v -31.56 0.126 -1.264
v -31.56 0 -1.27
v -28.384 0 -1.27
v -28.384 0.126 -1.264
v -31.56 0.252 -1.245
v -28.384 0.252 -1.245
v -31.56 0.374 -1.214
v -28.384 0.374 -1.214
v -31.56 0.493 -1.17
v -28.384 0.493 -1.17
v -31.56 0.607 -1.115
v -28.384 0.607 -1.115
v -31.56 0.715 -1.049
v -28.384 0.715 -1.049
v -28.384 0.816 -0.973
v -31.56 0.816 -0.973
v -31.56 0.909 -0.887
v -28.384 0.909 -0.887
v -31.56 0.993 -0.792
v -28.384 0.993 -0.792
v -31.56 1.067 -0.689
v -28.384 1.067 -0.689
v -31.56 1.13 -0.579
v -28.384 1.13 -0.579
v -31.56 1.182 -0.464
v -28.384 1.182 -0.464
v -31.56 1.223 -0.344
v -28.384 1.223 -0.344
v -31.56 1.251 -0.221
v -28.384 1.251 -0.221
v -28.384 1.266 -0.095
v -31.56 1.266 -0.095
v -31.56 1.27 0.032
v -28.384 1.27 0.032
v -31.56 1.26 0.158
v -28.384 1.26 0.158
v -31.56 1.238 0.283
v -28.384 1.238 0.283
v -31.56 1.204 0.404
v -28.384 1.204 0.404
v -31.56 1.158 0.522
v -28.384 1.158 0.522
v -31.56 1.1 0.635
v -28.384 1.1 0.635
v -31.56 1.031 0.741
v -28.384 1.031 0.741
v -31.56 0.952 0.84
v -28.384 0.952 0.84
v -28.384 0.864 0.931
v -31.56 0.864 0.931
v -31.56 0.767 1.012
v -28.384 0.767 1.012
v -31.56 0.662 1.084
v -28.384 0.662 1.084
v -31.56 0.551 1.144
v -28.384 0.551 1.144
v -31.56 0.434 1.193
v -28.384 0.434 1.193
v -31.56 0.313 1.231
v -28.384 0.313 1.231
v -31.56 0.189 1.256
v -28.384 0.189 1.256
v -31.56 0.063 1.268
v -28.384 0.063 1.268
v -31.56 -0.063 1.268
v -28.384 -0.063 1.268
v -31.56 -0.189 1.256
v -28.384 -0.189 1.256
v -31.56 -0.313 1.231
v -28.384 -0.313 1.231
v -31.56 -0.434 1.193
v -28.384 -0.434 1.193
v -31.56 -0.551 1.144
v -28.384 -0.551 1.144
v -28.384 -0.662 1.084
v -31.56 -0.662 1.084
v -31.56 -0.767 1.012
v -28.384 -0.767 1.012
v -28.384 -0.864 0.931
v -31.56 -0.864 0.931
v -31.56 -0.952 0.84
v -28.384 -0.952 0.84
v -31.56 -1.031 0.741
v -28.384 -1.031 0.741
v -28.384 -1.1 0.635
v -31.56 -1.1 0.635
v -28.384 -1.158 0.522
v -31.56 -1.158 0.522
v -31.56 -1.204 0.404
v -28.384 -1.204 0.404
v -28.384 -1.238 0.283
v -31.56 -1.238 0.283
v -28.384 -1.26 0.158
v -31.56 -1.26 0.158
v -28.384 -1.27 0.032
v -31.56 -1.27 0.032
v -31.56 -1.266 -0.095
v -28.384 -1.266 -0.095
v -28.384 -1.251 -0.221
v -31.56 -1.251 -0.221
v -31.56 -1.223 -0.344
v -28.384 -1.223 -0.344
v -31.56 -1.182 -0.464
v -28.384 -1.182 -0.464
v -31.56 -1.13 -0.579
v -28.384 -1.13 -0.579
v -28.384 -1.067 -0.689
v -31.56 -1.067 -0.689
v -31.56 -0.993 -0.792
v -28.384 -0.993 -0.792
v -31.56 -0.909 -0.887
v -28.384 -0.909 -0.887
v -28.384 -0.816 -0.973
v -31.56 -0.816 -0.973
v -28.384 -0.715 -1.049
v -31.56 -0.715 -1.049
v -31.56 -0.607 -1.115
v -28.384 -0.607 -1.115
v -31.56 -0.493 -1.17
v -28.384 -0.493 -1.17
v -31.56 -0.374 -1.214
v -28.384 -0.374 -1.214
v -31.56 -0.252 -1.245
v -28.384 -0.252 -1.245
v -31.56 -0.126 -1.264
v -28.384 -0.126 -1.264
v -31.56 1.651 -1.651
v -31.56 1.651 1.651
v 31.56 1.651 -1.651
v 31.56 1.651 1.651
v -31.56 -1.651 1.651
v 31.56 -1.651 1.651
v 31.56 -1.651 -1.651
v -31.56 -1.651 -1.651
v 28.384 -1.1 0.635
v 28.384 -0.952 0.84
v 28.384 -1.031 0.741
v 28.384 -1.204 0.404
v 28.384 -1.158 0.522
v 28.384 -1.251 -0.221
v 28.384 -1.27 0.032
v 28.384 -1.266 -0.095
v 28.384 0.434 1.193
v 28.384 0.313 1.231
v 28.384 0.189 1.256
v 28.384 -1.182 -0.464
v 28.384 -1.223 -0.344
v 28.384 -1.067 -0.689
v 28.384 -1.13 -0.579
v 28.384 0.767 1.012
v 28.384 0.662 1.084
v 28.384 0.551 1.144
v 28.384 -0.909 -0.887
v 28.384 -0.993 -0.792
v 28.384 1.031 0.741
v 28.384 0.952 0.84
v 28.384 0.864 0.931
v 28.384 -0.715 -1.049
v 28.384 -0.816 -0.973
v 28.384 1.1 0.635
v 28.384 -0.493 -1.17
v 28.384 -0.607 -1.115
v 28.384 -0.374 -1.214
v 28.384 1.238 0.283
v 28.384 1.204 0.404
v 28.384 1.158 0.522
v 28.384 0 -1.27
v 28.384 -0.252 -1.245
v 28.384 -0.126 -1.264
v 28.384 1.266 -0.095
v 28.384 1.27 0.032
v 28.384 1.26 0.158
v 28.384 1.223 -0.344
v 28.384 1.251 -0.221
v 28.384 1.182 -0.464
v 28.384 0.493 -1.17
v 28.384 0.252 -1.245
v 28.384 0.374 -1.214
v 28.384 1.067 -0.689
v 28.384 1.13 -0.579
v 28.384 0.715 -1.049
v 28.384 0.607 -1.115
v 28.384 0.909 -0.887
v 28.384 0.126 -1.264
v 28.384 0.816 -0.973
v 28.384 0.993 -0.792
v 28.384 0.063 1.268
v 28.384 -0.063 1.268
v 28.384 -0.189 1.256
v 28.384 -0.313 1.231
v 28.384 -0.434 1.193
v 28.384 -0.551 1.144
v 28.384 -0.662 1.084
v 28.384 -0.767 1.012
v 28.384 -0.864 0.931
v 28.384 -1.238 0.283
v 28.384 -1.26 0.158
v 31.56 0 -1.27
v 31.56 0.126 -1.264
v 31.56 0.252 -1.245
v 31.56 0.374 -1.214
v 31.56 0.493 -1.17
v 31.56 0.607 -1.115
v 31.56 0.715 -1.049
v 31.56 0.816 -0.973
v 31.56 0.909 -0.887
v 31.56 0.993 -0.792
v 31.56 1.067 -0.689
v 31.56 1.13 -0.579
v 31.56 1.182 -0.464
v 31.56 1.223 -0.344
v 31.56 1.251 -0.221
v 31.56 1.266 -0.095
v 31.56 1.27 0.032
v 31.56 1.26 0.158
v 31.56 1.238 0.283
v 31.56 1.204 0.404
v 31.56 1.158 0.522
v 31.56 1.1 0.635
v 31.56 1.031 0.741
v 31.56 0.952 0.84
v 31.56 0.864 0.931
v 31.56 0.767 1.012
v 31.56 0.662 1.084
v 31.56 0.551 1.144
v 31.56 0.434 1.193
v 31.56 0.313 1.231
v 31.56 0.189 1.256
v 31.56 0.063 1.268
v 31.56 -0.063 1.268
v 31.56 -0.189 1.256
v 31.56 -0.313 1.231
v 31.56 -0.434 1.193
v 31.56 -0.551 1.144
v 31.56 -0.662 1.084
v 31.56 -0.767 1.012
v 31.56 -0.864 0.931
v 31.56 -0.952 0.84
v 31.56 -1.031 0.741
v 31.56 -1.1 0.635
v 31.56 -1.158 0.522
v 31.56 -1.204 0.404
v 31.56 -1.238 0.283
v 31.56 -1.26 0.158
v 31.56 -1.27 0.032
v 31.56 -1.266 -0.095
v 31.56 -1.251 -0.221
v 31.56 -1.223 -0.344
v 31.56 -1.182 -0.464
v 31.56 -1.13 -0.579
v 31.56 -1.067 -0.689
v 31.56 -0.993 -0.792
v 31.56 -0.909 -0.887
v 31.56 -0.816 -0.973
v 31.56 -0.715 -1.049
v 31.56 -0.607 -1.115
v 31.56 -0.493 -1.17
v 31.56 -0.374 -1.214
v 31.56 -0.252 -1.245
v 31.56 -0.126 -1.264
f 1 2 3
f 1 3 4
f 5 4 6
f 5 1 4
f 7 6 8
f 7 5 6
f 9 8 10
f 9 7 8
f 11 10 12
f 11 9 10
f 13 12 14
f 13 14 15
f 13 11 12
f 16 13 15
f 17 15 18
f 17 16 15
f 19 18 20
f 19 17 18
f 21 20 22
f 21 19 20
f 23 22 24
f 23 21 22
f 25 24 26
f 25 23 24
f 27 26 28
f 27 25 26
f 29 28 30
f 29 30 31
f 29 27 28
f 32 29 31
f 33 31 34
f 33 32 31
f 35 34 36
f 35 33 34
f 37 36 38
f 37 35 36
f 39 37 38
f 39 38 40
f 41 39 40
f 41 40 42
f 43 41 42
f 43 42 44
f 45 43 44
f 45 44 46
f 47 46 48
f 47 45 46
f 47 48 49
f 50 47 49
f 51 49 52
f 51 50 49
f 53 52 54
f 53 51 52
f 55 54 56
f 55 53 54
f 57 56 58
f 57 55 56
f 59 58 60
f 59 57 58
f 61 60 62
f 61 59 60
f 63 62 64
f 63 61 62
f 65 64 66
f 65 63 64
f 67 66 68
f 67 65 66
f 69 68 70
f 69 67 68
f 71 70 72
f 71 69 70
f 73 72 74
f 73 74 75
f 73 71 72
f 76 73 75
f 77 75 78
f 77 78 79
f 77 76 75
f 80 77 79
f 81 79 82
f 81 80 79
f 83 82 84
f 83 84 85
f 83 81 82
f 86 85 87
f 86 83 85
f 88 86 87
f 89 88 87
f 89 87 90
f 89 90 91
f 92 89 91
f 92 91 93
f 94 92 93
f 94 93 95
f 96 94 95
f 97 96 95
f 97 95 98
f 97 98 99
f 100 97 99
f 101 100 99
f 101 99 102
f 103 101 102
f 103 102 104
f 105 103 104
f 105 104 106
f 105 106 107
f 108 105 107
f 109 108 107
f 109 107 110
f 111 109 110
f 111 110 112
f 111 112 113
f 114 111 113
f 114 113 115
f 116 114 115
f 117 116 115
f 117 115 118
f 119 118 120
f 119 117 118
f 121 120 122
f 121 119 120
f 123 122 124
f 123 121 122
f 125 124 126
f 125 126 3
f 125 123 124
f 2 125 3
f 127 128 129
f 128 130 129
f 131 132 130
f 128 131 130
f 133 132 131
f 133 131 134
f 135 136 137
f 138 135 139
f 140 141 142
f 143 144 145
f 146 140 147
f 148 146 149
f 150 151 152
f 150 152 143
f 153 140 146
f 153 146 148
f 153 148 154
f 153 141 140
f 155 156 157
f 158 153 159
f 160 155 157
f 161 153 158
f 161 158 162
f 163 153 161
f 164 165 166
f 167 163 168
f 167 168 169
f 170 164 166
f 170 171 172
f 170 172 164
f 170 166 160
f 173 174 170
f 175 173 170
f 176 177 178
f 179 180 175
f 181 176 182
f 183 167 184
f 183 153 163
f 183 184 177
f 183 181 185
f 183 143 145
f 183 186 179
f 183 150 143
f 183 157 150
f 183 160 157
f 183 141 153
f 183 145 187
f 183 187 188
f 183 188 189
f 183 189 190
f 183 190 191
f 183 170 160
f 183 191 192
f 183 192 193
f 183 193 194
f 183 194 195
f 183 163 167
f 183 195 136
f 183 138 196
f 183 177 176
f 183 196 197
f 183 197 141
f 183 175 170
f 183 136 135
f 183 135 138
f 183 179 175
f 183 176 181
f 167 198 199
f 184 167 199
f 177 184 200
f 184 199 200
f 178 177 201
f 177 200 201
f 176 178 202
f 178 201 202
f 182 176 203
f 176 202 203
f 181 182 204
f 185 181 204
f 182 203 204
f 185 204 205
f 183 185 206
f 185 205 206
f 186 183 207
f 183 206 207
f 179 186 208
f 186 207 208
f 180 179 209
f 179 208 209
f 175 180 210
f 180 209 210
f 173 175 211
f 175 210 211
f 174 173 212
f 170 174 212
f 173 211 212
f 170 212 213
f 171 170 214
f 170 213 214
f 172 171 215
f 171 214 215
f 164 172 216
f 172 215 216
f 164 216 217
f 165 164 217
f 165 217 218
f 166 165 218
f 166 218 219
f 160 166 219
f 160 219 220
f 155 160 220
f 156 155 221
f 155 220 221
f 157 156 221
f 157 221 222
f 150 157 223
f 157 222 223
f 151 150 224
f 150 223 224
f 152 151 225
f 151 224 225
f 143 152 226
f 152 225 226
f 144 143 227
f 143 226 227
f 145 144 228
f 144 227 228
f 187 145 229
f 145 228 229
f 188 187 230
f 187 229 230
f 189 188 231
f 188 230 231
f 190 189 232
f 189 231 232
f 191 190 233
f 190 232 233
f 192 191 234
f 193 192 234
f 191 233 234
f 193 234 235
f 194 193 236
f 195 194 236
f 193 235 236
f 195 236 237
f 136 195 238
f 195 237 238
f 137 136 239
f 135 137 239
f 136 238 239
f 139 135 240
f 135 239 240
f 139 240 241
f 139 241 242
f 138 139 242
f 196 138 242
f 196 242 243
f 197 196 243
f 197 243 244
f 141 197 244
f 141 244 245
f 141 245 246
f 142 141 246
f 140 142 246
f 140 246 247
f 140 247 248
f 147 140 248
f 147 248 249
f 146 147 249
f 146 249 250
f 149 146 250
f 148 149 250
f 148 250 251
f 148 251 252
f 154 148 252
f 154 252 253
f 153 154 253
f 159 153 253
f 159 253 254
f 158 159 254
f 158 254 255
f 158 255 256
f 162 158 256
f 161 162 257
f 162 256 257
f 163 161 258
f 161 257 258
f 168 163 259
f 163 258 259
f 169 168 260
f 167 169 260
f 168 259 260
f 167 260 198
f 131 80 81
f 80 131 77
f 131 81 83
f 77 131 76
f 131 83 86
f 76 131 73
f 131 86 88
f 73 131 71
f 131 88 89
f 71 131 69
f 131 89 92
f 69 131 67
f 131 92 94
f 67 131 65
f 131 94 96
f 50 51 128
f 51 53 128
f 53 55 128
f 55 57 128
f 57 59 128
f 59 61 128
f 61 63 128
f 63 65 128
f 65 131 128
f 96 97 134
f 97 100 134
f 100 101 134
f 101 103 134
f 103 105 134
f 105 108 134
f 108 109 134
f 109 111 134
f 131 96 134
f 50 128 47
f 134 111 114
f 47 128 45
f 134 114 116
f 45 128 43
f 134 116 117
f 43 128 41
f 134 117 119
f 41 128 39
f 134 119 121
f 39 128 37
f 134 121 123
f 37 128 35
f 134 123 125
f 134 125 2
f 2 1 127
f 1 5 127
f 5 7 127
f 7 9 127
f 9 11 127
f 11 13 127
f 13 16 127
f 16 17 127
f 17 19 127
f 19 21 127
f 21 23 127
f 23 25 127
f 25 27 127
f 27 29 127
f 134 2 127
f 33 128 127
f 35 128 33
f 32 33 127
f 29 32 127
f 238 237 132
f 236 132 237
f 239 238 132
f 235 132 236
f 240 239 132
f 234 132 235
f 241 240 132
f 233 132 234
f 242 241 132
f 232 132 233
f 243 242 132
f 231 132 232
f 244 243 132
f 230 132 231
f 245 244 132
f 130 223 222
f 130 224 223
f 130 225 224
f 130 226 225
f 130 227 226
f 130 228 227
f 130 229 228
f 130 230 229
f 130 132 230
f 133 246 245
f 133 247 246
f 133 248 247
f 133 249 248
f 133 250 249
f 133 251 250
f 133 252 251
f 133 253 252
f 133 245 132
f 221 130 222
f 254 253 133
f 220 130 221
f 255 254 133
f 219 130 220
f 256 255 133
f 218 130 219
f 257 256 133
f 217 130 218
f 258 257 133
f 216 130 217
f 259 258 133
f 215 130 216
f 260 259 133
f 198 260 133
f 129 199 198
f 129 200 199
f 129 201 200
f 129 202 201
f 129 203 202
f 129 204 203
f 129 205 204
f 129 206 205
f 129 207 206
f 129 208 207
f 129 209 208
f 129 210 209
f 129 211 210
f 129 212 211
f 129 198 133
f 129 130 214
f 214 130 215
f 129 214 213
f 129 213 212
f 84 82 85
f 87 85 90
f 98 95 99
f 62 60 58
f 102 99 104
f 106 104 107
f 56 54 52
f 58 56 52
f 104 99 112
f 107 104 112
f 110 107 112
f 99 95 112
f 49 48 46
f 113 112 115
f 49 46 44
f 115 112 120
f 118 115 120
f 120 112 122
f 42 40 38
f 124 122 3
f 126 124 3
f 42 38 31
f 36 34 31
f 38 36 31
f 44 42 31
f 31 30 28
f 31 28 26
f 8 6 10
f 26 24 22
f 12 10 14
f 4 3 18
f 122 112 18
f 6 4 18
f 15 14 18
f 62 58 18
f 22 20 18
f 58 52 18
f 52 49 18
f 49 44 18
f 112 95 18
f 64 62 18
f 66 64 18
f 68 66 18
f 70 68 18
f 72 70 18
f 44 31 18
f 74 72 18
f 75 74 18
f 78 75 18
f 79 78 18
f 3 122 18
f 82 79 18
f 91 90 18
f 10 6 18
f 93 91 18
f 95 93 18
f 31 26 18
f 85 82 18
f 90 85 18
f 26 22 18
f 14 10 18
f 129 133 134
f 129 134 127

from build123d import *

# Parameters (mm, degrees)
SKETCH1_W           = 3.302
SKETCH1_H           = 3.302
BOSS_EXTRUDE1_DEPTH = 31.5595
SKETCH2_R           = 1.27
CUT_EXTRUDE1_DEPTH  = 3.175


with BuildPart() as part:
    # Sketch1 → Boss-Extrude1 (new body, symmetric)
    with BuildSketch(Plane(origin=(0, 0, 0), x_dir=(0, 0, -1), z_dir=(1, 0, 0))):
        Rectangle(SKETCH1_W, SKETCH1_H)
    extrude(amount=BOSS_EXTRUDE1_DEPTH, both=True)

    # Sketch2 → Cut-Extrude1 (cut)
    with BuildSketch(Plane(origin=(31.5595, 0, 0), x_dir=(0, 0, -1), z_dir=(1, 0, 0))):
        Circle(SKETCH2_R)
    cut_extrude1 = extrude(amount=-CUT_EXTRUDE1_DEPTH, mode=Mode.SUBTRACT)

    # Mirror1: Cut-Extrude1 across plane
    add(cut_extrude1.mirror(Plane(origin=(0, 0, 0), x_dir=(0, 0, 1), z_dir=(1, 0, 0))), mode=Mode.SUBTRACT)


solid = part.part
